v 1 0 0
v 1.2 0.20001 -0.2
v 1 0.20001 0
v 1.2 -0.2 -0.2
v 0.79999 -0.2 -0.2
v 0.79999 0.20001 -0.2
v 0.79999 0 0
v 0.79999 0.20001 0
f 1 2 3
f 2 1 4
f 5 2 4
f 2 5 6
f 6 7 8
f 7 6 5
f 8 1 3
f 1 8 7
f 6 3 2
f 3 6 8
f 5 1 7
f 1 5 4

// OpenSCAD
// Listen, this is just trial and error here.
intersection() {
    translate([0,1,0])
    rotate([90,0,0])
    linear_extrude(1.5) {
        polygon([[.8,0], [1, 0], [1.2,-.2], [.8, -.2], ]);
    };

    translate([1.5,1,0])
    rotate([90,0,-90])
    linear_extrude(1.5) {
        polygon([[.8,0], [1, 0], [1.2,-.2], [.8, -.2], ]);
    };
}
